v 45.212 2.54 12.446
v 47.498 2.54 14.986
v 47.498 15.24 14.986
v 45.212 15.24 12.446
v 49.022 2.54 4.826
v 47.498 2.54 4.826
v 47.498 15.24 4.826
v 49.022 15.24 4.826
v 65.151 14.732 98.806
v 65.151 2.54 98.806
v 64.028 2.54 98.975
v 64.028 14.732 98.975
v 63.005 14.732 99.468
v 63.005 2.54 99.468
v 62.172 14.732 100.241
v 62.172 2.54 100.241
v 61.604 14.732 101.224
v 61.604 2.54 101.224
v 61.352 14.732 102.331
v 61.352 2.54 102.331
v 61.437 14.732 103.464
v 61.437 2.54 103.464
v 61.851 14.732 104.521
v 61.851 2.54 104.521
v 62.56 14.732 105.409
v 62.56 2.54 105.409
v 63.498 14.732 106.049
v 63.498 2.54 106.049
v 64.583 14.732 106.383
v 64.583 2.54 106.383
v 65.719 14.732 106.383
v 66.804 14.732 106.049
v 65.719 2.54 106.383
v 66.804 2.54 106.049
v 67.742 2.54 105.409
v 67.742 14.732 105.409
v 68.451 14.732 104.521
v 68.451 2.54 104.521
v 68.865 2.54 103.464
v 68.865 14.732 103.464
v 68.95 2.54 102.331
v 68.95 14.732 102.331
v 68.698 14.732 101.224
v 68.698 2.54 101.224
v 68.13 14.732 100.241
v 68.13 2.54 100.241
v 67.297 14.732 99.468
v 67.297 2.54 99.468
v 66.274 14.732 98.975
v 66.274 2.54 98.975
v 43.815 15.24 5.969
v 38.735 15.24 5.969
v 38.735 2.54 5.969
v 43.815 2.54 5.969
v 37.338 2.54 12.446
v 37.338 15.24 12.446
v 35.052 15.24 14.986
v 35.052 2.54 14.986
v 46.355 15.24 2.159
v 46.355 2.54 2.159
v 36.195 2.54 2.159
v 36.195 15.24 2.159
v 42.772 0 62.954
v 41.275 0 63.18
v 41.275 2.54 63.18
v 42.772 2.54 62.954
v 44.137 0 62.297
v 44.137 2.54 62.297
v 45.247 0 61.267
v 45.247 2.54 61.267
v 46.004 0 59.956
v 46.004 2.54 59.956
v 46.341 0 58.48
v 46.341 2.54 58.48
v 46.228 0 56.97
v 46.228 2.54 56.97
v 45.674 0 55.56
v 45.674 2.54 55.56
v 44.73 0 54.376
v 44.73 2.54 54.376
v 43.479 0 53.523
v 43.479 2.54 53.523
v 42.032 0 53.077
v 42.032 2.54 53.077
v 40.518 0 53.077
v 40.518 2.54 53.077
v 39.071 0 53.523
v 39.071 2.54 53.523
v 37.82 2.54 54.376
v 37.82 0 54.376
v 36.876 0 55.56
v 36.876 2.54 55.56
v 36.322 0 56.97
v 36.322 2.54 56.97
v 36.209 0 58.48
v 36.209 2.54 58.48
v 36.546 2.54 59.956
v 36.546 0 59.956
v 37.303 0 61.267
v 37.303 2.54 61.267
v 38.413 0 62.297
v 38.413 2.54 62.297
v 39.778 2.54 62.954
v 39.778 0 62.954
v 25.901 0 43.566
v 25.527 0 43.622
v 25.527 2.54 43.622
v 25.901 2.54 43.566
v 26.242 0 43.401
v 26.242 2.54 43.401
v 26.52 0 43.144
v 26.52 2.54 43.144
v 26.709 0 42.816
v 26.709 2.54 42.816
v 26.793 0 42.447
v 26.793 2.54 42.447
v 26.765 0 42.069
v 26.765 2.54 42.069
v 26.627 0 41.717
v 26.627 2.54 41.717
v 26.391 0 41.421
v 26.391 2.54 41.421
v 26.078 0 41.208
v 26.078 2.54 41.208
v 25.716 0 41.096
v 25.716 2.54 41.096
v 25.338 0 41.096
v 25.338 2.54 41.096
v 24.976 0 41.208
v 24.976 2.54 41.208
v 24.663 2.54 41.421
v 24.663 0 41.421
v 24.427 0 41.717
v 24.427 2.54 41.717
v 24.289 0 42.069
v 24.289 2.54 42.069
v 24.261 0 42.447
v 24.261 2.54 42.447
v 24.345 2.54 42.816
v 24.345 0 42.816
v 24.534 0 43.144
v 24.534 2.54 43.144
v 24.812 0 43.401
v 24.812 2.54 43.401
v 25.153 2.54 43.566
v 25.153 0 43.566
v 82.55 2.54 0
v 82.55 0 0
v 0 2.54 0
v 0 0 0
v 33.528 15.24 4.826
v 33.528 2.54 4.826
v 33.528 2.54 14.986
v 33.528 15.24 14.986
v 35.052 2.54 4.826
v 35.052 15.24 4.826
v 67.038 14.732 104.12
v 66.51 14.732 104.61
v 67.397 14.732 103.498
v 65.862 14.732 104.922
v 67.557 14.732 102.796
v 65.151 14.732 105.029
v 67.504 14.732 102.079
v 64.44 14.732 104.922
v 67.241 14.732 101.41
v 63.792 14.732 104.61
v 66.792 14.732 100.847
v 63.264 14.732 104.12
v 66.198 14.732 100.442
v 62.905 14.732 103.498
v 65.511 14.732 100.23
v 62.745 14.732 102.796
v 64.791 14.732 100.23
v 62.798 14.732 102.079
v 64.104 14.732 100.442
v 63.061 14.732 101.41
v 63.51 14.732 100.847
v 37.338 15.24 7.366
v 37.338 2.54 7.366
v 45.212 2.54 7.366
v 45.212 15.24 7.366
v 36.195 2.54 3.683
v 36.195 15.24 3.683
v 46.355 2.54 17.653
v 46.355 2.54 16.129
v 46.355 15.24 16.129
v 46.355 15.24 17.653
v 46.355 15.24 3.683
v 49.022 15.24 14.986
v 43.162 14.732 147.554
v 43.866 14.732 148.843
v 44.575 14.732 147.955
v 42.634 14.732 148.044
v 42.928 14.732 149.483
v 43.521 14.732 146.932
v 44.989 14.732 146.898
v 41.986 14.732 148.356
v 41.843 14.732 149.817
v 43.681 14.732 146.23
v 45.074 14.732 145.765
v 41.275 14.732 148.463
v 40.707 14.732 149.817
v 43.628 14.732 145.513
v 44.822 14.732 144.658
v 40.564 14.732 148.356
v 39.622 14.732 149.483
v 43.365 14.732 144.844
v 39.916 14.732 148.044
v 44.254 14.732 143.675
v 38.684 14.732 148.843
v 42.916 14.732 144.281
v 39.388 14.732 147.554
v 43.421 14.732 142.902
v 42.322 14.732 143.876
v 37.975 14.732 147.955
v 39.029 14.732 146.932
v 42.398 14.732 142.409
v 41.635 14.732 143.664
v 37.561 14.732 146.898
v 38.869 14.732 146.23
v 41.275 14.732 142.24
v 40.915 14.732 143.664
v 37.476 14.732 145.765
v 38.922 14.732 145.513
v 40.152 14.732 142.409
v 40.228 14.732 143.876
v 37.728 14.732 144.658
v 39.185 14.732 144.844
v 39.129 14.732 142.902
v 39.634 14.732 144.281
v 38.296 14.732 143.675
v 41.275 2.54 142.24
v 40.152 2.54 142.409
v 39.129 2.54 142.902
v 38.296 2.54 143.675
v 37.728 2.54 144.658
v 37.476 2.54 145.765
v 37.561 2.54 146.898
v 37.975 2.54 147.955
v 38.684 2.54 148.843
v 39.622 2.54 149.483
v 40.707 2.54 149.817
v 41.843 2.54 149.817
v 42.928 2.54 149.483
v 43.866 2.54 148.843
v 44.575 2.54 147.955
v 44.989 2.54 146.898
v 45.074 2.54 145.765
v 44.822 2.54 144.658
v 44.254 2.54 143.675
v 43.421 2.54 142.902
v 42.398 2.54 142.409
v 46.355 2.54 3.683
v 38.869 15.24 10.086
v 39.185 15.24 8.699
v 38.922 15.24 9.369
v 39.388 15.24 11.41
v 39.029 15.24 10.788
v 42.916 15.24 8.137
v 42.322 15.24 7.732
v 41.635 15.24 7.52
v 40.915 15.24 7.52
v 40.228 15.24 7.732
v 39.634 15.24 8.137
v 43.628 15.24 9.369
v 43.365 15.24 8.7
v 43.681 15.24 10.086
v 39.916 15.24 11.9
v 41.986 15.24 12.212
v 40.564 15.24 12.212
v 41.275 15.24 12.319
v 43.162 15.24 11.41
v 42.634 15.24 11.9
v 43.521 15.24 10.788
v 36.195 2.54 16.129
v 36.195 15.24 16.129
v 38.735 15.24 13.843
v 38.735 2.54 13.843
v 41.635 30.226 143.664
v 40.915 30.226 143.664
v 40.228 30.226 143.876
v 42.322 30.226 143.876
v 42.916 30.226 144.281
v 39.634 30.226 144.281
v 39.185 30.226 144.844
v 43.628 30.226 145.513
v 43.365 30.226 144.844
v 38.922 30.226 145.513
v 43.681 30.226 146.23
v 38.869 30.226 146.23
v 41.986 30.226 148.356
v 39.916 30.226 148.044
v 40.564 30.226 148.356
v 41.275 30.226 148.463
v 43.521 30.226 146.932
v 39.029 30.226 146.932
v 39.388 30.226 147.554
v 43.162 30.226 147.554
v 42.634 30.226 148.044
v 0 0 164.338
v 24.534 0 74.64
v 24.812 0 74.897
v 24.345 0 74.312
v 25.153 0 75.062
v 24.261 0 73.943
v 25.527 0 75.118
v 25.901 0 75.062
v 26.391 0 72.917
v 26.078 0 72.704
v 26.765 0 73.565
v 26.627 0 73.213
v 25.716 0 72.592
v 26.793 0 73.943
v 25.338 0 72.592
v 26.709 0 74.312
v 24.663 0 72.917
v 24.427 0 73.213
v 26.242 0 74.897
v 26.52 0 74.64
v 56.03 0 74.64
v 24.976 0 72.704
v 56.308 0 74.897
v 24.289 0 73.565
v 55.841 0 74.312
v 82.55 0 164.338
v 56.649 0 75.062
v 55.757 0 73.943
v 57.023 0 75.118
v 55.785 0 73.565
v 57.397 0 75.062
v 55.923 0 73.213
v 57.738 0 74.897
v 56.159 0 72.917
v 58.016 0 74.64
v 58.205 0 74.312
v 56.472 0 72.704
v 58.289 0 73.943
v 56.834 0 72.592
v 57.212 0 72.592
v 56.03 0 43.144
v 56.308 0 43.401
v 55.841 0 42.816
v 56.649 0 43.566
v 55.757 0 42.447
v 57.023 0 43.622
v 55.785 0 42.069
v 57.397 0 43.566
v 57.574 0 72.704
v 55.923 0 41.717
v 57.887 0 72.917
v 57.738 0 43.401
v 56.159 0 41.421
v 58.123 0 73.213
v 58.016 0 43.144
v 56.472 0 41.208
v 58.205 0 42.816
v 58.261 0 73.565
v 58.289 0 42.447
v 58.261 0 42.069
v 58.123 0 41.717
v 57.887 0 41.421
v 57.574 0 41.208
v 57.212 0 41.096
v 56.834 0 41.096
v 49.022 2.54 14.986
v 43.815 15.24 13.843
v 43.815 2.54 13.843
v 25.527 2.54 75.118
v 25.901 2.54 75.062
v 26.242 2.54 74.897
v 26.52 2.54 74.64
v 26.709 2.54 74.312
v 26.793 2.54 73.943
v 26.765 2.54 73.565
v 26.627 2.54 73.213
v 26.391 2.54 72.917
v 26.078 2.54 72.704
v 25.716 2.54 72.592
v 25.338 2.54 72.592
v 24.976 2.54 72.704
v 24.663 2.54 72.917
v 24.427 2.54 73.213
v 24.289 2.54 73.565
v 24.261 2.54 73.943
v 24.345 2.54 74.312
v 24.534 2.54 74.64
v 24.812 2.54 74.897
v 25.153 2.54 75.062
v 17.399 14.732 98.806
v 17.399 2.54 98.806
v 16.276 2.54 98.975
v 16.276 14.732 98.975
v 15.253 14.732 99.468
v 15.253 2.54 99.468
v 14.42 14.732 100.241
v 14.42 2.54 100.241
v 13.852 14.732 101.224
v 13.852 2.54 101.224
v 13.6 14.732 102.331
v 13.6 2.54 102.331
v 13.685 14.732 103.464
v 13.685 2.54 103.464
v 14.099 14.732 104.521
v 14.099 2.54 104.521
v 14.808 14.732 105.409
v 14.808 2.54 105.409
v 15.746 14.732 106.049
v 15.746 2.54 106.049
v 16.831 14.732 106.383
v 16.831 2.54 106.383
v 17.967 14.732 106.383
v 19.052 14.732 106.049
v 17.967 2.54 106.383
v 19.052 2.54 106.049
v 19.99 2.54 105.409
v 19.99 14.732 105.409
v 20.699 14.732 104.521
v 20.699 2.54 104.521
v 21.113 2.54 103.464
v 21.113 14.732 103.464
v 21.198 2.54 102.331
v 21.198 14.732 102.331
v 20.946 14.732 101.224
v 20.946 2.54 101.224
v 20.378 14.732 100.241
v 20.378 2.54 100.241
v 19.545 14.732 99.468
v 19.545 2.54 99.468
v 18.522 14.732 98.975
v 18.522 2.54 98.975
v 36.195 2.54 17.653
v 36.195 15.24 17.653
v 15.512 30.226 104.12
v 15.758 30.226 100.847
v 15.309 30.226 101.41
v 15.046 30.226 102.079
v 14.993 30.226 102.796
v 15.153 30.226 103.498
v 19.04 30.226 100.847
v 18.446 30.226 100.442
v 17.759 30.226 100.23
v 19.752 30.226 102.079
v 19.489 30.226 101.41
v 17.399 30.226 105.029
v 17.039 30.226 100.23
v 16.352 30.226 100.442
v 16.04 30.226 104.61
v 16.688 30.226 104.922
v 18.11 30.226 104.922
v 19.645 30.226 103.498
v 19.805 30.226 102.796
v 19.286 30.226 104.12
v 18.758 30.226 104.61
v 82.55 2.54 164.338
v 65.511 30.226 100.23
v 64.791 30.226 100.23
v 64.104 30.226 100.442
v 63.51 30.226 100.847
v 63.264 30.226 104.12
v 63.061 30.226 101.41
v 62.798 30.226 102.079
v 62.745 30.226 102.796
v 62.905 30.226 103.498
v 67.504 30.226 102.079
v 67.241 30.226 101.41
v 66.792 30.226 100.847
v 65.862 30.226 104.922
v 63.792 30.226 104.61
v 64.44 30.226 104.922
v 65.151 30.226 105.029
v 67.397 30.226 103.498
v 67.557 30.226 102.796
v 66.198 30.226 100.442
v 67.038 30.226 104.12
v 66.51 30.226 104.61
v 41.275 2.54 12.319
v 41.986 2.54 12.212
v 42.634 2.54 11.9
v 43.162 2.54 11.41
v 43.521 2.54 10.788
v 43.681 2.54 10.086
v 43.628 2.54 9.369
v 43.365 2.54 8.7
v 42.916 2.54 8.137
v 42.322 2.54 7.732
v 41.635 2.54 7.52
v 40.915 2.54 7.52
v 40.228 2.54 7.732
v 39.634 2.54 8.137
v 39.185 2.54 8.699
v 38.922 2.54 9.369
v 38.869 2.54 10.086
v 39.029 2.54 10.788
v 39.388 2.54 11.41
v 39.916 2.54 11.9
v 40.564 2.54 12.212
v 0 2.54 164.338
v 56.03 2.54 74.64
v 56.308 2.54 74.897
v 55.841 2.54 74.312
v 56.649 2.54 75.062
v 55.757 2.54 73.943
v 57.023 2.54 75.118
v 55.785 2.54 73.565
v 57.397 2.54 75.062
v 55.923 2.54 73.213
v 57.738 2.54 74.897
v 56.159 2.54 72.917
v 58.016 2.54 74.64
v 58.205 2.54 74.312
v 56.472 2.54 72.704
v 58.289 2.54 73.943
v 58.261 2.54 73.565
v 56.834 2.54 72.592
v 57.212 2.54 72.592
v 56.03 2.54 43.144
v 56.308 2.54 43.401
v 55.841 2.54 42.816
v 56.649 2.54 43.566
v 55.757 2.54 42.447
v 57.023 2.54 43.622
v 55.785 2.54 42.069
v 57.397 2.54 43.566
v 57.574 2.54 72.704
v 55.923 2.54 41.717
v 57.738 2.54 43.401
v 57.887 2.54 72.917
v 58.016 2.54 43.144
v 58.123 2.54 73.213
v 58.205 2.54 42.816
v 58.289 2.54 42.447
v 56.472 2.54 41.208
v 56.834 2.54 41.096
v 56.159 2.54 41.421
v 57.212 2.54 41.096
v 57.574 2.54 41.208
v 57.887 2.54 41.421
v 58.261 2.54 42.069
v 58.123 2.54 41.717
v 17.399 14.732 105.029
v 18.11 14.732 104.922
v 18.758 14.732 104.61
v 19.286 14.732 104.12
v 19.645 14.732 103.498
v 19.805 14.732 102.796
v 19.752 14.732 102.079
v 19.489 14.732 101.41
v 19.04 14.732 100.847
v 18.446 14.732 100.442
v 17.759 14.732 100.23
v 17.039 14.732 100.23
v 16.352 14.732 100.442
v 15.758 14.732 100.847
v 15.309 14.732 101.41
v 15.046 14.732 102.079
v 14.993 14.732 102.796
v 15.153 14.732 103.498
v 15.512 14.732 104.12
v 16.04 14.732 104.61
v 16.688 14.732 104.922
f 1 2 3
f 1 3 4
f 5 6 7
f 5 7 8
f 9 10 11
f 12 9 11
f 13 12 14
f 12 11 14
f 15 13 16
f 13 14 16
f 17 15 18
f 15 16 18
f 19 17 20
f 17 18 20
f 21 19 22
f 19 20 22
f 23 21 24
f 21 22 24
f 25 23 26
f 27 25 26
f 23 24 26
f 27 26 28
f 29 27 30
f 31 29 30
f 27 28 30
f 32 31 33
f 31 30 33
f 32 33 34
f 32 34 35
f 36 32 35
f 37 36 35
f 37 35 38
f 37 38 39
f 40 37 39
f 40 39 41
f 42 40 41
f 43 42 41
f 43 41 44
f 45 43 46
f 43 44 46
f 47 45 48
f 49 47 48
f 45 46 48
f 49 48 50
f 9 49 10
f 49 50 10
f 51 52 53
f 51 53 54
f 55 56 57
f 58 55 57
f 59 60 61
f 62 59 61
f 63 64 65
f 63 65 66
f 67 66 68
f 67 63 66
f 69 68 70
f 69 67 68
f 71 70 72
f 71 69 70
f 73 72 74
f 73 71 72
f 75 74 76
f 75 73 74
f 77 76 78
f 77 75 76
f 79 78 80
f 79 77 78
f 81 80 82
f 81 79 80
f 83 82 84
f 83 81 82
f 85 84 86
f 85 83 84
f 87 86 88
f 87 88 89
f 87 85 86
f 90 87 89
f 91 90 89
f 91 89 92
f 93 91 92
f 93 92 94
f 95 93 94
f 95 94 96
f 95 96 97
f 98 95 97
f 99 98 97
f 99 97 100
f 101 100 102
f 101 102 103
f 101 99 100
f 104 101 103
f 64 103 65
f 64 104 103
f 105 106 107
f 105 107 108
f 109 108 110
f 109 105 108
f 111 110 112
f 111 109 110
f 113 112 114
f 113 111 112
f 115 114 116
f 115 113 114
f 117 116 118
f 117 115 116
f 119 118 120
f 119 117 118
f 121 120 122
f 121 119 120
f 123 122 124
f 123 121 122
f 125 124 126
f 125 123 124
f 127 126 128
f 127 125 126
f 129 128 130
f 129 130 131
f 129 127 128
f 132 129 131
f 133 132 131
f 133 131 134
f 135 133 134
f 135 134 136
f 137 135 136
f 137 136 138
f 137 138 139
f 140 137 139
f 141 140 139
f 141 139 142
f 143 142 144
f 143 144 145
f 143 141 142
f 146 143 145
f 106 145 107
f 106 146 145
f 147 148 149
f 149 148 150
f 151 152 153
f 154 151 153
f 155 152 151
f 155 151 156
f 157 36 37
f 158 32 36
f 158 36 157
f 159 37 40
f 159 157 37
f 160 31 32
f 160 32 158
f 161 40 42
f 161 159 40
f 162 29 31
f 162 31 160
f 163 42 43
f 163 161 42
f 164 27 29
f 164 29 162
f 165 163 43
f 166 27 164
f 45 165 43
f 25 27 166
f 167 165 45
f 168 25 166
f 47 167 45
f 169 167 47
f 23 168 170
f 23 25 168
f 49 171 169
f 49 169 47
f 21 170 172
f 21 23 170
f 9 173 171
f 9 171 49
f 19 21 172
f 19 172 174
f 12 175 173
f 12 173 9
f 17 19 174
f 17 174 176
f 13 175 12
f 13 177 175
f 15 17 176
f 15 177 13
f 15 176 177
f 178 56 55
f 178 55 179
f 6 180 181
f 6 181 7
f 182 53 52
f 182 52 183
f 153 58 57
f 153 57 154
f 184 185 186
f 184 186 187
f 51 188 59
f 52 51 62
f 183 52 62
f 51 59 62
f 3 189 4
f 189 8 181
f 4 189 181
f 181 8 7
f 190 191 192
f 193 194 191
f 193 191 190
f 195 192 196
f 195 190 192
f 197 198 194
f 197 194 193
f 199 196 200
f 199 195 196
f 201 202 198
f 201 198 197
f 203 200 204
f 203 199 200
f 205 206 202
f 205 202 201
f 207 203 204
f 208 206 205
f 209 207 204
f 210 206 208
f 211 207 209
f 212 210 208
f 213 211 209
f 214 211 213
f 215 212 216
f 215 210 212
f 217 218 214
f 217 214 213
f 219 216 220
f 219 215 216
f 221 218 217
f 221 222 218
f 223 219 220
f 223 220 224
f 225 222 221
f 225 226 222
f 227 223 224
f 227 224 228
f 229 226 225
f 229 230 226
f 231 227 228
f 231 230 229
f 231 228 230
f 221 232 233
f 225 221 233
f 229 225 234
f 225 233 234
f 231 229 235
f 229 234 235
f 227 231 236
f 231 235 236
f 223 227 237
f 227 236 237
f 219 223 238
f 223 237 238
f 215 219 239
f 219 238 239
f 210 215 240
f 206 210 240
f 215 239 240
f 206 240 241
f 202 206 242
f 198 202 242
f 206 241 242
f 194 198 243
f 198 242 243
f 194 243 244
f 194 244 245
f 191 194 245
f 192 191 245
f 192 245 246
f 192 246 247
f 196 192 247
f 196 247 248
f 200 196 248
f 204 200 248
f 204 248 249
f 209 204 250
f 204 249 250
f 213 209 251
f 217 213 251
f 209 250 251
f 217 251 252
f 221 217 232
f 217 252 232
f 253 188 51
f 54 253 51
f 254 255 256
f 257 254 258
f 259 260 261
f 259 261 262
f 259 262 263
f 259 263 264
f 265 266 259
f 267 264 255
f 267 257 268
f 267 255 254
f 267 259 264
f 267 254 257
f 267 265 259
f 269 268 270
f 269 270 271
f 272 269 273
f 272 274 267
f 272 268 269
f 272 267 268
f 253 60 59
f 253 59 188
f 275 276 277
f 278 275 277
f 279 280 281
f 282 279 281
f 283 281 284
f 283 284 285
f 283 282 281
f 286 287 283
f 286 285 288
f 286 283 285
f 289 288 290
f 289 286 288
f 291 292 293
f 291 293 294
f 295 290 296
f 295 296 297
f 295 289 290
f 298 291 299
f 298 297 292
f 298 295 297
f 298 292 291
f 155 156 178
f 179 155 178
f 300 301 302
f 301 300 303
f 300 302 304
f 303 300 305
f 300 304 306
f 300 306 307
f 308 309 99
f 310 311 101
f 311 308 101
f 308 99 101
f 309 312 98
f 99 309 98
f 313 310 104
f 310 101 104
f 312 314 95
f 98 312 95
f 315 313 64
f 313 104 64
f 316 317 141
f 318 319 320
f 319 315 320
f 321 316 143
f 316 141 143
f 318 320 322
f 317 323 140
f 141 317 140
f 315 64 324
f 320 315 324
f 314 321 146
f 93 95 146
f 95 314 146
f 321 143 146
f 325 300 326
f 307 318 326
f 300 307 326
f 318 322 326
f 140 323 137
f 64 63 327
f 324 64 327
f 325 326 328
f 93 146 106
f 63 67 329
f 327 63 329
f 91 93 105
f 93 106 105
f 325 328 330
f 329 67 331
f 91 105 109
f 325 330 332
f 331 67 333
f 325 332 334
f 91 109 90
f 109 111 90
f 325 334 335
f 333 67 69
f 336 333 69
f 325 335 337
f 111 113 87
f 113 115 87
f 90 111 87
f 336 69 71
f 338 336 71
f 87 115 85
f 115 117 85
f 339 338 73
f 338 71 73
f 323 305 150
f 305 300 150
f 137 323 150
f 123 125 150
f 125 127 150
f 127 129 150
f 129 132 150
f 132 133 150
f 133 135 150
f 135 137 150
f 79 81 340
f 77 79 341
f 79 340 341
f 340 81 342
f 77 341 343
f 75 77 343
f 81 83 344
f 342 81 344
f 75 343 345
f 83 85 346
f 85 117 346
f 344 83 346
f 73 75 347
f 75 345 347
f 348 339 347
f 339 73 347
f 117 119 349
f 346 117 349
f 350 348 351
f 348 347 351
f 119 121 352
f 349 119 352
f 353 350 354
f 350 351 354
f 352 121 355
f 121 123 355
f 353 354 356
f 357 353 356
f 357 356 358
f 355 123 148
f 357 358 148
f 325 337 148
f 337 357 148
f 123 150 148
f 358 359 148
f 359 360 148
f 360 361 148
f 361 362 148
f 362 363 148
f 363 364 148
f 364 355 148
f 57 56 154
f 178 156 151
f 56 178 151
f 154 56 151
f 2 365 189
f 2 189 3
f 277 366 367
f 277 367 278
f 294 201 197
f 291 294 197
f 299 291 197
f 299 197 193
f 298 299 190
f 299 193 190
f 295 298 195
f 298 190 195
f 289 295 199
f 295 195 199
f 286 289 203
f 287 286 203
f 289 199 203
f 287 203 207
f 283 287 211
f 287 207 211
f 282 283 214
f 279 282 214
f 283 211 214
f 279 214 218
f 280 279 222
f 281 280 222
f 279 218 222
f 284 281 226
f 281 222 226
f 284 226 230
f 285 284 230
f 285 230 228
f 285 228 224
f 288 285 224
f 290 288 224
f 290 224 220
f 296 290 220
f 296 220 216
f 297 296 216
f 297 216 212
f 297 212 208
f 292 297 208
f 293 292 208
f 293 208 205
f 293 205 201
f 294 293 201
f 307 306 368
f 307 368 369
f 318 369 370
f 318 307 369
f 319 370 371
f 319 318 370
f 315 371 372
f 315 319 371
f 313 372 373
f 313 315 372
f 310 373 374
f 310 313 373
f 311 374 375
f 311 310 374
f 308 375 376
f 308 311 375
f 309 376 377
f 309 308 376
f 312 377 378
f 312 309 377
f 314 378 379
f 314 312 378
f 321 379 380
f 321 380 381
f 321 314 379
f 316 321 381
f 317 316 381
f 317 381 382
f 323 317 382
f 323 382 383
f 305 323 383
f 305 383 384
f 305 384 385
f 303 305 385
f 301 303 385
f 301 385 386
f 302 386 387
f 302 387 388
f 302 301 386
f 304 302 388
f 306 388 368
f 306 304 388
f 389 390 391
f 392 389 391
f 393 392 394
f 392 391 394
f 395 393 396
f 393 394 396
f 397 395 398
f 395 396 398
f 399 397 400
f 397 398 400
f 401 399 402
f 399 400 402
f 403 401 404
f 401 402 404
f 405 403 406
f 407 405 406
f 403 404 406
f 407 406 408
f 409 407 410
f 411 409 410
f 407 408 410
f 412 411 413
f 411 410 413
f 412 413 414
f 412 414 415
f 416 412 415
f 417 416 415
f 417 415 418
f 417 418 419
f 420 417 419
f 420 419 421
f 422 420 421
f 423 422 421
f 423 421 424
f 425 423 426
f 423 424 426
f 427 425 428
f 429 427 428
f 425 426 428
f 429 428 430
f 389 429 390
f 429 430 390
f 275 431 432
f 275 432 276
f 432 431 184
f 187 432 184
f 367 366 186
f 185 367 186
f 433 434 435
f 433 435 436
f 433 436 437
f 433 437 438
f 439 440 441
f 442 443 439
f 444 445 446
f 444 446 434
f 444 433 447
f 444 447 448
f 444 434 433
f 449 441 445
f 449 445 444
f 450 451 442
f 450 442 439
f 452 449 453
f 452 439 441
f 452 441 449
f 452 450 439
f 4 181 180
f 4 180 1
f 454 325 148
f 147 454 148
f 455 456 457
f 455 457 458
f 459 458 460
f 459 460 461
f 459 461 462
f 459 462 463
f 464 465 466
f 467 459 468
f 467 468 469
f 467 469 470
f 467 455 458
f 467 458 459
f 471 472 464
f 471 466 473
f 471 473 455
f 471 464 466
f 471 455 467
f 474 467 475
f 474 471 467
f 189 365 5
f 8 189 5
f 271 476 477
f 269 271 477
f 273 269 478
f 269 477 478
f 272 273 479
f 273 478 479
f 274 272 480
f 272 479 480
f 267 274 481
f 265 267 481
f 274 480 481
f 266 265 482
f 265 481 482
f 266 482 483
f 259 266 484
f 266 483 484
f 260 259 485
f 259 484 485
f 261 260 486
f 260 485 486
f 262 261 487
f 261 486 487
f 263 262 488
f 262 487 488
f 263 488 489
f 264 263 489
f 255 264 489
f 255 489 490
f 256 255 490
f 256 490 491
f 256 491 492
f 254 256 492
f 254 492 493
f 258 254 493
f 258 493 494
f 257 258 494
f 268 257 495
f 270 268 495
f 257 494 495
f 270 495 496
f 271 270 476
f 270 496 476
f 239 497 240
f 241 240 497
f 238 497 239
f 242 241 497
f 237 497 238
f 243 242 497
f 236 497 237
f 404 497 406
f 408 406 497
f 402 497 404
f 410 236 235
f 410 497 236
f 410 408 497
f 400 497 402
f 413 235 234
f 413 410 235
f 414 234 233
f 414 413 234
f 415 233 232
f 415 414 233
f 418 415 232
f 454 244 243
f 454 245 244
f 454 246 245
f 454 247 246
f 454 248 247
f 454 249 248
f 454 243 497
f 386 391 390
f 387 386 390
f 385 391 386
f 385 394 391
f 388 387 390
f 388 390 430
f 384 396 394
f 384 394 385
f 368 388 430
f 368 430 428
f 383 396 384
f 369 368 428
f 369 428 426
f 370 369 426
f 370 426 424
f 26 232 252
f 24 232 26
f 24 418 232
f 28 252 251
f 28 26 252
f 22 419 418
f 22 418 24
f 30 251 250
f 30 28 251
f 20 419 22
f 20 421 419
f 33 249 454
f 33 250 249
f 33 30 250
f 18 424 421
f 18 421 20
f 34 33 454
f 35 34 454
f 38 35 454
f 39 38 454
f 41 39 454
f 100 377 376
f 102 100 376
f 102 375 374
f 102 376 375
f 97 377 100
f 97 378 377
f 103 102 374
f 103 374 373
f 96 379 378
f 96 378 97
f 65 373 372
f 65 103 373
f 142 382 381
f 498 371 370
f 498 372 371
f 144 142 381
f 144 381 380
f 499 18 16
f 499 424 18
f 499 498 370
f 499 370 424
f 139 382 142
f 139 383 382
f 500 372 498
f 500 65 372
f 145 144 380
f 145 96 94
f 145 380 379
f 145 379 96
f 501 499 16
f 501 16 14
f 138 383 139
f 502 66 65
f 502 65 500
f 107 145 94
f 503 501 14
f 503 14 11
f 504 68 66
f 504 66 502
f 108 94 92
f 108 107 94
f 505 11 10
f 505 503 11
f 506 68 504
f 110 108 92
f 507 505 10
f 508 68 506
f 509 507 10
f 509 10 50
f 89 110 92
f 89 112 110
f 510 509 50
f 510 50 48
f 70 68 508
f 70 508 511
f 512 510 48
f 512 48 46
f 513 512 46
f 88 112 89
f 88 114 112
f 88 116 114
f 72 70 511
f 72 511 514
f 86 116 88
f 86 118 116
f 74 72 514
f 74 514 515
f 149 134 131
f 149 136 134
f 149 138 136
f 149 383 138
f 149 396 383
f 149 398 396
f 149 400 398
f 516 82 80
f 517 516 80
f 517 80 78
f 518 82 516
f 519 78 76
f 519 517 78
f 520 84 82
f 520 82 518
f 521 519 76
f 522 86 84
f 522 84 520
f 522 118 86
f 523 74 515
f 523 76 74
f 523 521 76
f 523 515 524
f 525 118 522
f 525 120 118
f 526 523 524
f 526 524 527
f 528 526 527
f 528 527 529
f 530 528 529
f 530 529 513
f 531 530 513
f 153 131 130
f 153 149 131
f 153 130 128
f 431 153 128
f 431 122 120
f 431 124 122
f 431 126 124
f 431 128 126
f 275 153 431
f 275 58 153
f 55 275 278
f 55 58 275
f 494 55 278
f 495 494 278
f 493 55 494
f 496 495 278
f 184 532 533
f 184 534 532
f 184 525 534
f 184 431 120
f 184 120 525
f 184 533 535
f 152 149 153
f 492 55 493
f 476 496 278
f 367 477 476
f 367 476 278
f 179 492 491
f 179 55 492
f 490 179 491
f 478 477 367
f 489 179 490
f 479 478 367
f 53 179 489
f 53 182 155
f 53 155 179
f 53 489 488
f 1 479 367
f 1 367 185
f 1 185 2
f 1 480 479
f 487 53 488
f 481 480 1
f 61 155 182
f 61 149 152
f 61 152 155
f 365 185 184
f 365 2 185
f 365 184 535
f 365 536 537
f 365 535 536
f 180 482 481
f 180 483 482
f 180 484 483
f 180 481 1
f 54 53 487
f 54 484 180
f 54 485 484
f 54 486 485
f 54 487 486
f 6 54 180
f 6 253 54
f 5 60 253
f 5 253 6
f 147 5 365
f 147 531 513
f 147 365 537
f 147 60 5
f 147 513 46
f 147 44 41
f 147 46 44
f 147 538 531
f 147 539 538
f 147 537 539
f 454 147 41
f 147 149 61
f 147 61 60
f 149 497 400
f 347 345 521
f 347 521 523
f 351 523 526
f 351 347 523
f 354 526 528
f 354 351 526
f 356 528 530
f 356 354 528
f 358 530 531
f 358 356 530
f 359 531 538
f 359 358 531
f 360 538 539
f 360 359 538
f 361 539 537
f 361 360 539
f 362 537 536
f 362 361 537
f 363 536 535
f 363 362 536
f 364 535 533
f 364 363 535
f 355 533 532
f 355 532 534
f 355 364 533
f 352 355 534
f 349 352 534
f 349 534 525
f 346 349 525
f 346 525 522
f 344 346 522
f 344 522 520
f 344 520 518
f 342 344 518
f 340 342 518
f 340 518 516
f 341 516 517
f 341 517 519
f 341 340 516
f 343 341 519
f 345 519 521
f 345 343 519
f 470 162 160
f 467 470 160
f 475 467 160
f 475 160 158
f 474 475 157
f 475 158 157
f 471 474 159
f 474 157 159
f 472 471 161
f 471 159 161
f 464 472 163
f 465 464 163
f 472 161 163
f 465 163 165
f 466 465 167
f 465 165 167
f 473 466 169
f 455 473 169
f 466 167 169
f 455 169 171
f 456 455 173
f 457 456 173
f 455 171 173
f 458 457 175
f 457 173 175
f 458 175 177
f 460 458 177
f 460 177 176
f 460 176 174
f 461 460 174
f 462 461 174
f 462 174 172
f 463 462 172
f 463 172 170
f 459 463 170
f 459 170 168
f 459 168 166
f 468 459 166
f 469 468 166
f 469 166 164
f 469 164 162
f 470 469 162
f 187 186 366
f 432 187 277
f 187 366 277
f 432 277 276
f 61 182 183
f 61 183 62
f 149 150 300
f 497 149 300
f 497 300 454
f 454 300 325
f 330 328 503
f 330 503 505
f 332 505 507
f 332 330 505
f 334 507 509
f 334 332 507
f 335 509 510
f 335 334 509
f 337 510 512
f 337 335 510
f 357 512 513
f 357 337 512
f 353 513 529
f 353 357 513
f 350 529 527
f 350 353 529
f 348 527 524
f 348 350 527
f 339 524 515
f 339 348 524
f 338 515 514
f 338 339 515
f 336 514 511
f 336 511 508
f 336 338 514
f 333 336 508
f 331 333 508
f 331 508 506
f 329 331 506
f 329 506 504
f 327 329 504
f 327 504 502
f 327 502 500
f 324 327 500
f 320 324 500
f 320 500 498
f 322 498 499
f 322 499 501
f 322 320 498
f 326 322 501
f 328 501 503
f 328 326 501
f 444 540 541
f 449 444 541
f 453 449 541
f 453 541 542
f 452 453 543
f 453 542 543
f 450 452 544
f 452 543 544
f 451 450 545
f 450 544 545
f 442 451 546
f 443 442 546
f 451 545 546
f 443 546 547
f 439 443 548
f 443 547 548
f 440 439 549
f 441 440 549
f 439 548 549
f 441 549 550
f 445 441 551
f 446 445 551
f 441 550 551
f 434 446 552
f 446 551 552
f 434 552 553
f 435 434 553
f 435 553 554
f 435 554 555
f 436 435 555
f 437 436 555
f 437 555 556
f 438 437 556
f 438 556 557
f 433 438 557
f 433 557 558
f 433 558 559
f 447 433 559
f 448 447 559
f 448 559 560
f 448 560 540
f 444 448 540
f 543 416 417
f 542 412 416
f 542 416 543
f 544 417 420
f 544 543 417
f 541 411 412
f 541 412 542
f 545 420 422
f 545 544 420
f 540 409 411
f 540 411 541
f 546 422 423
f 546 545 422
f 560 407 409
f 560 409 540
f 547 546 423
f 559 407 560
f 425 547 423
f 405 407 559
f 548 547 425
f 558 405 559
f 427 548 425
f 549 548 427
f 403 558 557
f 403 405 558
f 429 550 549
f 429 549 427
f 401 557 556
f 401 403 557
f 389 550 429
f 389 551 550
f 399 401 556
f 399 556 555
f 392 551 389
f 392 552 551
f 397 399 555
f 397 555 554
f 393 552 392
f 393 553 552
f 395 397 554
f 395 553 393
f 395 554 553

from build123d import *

# Parameters (mm, degrees)
SKETCH1_R               = 5.08
SKETCH1_R_2             = 1.27
BASE_EXTRUDE_DEPTH      = 2.54
SKETCH6_R               = 2.413
MIDDLE_BAR_HOLDER_DEPTH = 12.7
SKETCH7_R               = 2.413
BOSS_EXTRUDE6_DEPTH     = 27.686
SKETCH7_3_R             = 3.81
SKETCH7_3_R_2           = 2.413
BOSS_EXTRUDE7_DEPTH     = 12.192


with BuildPart() as part:
    # Sketch1 → base extrude (new body)
    with BuildSketch(Plane(origin=(0, 0, 0), x_dir=(1, 0, 0), z_dir=(0, 1, 0))):
        Polygon((82.55, -164.338), (82.55, -58.1000108), (82.55, 0), (0, 0), (0, -164.338), align=None)
        with Locations(Location((41.275, -58.1000108, 0), (0, 0, 270))):
            Circle(SKETCH1_R, mode=Mode.SUBTRACT)
        with Locations(Location((25.527, -42.3520108, 0), (0, 0, 270))):
            Circle(SKETCH1_R_2, mode=Mode.SUBTRACT)
        with Locations(Location((57.023, -42.3520108, 0), (0, 0, 270))):
            Circle(SKETCH1_R_2, mode=Mode.SUBTRACT)
        with Locations(Location((25.527, -73.8480108, 0), (0, 0, 270))):
            Circle(SKETCH1_R_2, mode=Mode.SUBTRACT)
        with Locations(Location((57.023, -73.8480108, 0), (0, 0, 270))):
            Circle(SKETCH1_R_2, mode=Mode.SUBTRACT)
    extrude(amount=BASE_EXTRUDE_DEPTH)

    # Sketch6 → middle bar holder (add)
    with BuildSketch(Plane(origin=(0, 2.54, 0), x_dir=(1, 0, 0), z_dir=(0, 1, 0))):
        Polygon((33.528, -9.906), (33.528, -4.826), (35.052, -4.826), (37.338, -7.366), (37.338, -9.906), (37.338, -12.446), (35.052, -14.986), (33.528, -14.986), align=None)
        with Locations(Location((41.275, -9.906, 0), (0, 0, 270))):
            Circle(SKETCH6_R)
        Polygon((41.275, -2.159), (46.355, -2.159), (46.355, -3.683), (43.815, -5.969), (41.275, -5.969), (38.735, -5.969), (36.195, -3.683), (36.195, -2.159), align=None)
        Polygon((47.498, -14.986), (45.212, -12.446), (45.212, -9.906), (45.212, -7.366), (47.498, -4.826), (49.022, -4.826), (49.022, -9.906), (49.022, -14.986), align=None)
        Polygon((41.275, -17.653), (36.195, -17.653), (36.195, -16.129), (38.735, -13.843), (41.275, -13.843), (43.815, -13.843), (46.355, -16.129), (46.355, -17.653), align=None)
    extrude(amount=MIDDLE_BAR_HOLDER_DEPTH)

    # Sketch7 → Boss-Extrude6 (add)
    with BuildSketch(Plane(origin=(0, 2.54, 0), x_dir=(1, 0, 0), z_dir=(0, 1, 0))):
        with Locations(Location((17.399, -102.616, 0), (0, 0, 270))):
            Circle(SKETCH7_R)
        with Locations(Location((41.275, -146.05, 0), (0, 0, 270))):
            Circle(SKETCH7_R)
        with Locations(Location((65.151, -102.616, 0), (0, 0, 270))):
            Circle(SKETCH7_R)
    extrude(amount=BOSS_EXTRUDE6_DEPTH)

    # Sketch7<3> → Boss-Extrude7 (add)
    # profile 1 of 3: a face of its own
    with BuildSketch(Plane(origin=(0, 2.54, 0), x_dir=(1, 0, 0), z_dir=(0, 1, 0))):
        with Locations(Location((41.275, -146.05, 0), (0, 0, 90))):
            Circle(SKETCH7_3_R)
        with Locations(Location((41.275, -146.05, 0), (0, 0, 270))):
            Circle(SKETCH7_3_R_2, mode=Mode.SUBTRACT)
    # profile 2 of 3: a face of its own
    with BuildSketch(Plane(origin=(0, 2.54, 0), x_dir=(1, 0, 0), z_dir=(0, 1, 0))):
        with Locations(Location((65.151, -102.616, 0), (0, 0, 90))):
            Circle(SKETCH7_3_R)
        with Locations(Location((65.151, -102.616, 0), (0, 0, 270))):
            Circle(SKETCH7_3_R_2, mode=Mode.SUBTRACT)
    # profile 3 of 3: a face of its own
    with BuildSketch(Plane(origin=(0, 2.54, 0), x_dir=(1, 0, 0), z_dir=(0, 1, 0))):
        with Locations(Location((17.399, -102.616, 0), (0, 0, 90))):
            Circle(SKETCH7_3_R)
        with Locations(Location((17.399, -102.616, 0), (0, 0, 270))):
            Circle(SKETCH7_3_R_2, mode=Mode.SUBTRACT)
    extrude(amount=BOSS_EXTRUDE7_DEPTH)


solid = part.part
